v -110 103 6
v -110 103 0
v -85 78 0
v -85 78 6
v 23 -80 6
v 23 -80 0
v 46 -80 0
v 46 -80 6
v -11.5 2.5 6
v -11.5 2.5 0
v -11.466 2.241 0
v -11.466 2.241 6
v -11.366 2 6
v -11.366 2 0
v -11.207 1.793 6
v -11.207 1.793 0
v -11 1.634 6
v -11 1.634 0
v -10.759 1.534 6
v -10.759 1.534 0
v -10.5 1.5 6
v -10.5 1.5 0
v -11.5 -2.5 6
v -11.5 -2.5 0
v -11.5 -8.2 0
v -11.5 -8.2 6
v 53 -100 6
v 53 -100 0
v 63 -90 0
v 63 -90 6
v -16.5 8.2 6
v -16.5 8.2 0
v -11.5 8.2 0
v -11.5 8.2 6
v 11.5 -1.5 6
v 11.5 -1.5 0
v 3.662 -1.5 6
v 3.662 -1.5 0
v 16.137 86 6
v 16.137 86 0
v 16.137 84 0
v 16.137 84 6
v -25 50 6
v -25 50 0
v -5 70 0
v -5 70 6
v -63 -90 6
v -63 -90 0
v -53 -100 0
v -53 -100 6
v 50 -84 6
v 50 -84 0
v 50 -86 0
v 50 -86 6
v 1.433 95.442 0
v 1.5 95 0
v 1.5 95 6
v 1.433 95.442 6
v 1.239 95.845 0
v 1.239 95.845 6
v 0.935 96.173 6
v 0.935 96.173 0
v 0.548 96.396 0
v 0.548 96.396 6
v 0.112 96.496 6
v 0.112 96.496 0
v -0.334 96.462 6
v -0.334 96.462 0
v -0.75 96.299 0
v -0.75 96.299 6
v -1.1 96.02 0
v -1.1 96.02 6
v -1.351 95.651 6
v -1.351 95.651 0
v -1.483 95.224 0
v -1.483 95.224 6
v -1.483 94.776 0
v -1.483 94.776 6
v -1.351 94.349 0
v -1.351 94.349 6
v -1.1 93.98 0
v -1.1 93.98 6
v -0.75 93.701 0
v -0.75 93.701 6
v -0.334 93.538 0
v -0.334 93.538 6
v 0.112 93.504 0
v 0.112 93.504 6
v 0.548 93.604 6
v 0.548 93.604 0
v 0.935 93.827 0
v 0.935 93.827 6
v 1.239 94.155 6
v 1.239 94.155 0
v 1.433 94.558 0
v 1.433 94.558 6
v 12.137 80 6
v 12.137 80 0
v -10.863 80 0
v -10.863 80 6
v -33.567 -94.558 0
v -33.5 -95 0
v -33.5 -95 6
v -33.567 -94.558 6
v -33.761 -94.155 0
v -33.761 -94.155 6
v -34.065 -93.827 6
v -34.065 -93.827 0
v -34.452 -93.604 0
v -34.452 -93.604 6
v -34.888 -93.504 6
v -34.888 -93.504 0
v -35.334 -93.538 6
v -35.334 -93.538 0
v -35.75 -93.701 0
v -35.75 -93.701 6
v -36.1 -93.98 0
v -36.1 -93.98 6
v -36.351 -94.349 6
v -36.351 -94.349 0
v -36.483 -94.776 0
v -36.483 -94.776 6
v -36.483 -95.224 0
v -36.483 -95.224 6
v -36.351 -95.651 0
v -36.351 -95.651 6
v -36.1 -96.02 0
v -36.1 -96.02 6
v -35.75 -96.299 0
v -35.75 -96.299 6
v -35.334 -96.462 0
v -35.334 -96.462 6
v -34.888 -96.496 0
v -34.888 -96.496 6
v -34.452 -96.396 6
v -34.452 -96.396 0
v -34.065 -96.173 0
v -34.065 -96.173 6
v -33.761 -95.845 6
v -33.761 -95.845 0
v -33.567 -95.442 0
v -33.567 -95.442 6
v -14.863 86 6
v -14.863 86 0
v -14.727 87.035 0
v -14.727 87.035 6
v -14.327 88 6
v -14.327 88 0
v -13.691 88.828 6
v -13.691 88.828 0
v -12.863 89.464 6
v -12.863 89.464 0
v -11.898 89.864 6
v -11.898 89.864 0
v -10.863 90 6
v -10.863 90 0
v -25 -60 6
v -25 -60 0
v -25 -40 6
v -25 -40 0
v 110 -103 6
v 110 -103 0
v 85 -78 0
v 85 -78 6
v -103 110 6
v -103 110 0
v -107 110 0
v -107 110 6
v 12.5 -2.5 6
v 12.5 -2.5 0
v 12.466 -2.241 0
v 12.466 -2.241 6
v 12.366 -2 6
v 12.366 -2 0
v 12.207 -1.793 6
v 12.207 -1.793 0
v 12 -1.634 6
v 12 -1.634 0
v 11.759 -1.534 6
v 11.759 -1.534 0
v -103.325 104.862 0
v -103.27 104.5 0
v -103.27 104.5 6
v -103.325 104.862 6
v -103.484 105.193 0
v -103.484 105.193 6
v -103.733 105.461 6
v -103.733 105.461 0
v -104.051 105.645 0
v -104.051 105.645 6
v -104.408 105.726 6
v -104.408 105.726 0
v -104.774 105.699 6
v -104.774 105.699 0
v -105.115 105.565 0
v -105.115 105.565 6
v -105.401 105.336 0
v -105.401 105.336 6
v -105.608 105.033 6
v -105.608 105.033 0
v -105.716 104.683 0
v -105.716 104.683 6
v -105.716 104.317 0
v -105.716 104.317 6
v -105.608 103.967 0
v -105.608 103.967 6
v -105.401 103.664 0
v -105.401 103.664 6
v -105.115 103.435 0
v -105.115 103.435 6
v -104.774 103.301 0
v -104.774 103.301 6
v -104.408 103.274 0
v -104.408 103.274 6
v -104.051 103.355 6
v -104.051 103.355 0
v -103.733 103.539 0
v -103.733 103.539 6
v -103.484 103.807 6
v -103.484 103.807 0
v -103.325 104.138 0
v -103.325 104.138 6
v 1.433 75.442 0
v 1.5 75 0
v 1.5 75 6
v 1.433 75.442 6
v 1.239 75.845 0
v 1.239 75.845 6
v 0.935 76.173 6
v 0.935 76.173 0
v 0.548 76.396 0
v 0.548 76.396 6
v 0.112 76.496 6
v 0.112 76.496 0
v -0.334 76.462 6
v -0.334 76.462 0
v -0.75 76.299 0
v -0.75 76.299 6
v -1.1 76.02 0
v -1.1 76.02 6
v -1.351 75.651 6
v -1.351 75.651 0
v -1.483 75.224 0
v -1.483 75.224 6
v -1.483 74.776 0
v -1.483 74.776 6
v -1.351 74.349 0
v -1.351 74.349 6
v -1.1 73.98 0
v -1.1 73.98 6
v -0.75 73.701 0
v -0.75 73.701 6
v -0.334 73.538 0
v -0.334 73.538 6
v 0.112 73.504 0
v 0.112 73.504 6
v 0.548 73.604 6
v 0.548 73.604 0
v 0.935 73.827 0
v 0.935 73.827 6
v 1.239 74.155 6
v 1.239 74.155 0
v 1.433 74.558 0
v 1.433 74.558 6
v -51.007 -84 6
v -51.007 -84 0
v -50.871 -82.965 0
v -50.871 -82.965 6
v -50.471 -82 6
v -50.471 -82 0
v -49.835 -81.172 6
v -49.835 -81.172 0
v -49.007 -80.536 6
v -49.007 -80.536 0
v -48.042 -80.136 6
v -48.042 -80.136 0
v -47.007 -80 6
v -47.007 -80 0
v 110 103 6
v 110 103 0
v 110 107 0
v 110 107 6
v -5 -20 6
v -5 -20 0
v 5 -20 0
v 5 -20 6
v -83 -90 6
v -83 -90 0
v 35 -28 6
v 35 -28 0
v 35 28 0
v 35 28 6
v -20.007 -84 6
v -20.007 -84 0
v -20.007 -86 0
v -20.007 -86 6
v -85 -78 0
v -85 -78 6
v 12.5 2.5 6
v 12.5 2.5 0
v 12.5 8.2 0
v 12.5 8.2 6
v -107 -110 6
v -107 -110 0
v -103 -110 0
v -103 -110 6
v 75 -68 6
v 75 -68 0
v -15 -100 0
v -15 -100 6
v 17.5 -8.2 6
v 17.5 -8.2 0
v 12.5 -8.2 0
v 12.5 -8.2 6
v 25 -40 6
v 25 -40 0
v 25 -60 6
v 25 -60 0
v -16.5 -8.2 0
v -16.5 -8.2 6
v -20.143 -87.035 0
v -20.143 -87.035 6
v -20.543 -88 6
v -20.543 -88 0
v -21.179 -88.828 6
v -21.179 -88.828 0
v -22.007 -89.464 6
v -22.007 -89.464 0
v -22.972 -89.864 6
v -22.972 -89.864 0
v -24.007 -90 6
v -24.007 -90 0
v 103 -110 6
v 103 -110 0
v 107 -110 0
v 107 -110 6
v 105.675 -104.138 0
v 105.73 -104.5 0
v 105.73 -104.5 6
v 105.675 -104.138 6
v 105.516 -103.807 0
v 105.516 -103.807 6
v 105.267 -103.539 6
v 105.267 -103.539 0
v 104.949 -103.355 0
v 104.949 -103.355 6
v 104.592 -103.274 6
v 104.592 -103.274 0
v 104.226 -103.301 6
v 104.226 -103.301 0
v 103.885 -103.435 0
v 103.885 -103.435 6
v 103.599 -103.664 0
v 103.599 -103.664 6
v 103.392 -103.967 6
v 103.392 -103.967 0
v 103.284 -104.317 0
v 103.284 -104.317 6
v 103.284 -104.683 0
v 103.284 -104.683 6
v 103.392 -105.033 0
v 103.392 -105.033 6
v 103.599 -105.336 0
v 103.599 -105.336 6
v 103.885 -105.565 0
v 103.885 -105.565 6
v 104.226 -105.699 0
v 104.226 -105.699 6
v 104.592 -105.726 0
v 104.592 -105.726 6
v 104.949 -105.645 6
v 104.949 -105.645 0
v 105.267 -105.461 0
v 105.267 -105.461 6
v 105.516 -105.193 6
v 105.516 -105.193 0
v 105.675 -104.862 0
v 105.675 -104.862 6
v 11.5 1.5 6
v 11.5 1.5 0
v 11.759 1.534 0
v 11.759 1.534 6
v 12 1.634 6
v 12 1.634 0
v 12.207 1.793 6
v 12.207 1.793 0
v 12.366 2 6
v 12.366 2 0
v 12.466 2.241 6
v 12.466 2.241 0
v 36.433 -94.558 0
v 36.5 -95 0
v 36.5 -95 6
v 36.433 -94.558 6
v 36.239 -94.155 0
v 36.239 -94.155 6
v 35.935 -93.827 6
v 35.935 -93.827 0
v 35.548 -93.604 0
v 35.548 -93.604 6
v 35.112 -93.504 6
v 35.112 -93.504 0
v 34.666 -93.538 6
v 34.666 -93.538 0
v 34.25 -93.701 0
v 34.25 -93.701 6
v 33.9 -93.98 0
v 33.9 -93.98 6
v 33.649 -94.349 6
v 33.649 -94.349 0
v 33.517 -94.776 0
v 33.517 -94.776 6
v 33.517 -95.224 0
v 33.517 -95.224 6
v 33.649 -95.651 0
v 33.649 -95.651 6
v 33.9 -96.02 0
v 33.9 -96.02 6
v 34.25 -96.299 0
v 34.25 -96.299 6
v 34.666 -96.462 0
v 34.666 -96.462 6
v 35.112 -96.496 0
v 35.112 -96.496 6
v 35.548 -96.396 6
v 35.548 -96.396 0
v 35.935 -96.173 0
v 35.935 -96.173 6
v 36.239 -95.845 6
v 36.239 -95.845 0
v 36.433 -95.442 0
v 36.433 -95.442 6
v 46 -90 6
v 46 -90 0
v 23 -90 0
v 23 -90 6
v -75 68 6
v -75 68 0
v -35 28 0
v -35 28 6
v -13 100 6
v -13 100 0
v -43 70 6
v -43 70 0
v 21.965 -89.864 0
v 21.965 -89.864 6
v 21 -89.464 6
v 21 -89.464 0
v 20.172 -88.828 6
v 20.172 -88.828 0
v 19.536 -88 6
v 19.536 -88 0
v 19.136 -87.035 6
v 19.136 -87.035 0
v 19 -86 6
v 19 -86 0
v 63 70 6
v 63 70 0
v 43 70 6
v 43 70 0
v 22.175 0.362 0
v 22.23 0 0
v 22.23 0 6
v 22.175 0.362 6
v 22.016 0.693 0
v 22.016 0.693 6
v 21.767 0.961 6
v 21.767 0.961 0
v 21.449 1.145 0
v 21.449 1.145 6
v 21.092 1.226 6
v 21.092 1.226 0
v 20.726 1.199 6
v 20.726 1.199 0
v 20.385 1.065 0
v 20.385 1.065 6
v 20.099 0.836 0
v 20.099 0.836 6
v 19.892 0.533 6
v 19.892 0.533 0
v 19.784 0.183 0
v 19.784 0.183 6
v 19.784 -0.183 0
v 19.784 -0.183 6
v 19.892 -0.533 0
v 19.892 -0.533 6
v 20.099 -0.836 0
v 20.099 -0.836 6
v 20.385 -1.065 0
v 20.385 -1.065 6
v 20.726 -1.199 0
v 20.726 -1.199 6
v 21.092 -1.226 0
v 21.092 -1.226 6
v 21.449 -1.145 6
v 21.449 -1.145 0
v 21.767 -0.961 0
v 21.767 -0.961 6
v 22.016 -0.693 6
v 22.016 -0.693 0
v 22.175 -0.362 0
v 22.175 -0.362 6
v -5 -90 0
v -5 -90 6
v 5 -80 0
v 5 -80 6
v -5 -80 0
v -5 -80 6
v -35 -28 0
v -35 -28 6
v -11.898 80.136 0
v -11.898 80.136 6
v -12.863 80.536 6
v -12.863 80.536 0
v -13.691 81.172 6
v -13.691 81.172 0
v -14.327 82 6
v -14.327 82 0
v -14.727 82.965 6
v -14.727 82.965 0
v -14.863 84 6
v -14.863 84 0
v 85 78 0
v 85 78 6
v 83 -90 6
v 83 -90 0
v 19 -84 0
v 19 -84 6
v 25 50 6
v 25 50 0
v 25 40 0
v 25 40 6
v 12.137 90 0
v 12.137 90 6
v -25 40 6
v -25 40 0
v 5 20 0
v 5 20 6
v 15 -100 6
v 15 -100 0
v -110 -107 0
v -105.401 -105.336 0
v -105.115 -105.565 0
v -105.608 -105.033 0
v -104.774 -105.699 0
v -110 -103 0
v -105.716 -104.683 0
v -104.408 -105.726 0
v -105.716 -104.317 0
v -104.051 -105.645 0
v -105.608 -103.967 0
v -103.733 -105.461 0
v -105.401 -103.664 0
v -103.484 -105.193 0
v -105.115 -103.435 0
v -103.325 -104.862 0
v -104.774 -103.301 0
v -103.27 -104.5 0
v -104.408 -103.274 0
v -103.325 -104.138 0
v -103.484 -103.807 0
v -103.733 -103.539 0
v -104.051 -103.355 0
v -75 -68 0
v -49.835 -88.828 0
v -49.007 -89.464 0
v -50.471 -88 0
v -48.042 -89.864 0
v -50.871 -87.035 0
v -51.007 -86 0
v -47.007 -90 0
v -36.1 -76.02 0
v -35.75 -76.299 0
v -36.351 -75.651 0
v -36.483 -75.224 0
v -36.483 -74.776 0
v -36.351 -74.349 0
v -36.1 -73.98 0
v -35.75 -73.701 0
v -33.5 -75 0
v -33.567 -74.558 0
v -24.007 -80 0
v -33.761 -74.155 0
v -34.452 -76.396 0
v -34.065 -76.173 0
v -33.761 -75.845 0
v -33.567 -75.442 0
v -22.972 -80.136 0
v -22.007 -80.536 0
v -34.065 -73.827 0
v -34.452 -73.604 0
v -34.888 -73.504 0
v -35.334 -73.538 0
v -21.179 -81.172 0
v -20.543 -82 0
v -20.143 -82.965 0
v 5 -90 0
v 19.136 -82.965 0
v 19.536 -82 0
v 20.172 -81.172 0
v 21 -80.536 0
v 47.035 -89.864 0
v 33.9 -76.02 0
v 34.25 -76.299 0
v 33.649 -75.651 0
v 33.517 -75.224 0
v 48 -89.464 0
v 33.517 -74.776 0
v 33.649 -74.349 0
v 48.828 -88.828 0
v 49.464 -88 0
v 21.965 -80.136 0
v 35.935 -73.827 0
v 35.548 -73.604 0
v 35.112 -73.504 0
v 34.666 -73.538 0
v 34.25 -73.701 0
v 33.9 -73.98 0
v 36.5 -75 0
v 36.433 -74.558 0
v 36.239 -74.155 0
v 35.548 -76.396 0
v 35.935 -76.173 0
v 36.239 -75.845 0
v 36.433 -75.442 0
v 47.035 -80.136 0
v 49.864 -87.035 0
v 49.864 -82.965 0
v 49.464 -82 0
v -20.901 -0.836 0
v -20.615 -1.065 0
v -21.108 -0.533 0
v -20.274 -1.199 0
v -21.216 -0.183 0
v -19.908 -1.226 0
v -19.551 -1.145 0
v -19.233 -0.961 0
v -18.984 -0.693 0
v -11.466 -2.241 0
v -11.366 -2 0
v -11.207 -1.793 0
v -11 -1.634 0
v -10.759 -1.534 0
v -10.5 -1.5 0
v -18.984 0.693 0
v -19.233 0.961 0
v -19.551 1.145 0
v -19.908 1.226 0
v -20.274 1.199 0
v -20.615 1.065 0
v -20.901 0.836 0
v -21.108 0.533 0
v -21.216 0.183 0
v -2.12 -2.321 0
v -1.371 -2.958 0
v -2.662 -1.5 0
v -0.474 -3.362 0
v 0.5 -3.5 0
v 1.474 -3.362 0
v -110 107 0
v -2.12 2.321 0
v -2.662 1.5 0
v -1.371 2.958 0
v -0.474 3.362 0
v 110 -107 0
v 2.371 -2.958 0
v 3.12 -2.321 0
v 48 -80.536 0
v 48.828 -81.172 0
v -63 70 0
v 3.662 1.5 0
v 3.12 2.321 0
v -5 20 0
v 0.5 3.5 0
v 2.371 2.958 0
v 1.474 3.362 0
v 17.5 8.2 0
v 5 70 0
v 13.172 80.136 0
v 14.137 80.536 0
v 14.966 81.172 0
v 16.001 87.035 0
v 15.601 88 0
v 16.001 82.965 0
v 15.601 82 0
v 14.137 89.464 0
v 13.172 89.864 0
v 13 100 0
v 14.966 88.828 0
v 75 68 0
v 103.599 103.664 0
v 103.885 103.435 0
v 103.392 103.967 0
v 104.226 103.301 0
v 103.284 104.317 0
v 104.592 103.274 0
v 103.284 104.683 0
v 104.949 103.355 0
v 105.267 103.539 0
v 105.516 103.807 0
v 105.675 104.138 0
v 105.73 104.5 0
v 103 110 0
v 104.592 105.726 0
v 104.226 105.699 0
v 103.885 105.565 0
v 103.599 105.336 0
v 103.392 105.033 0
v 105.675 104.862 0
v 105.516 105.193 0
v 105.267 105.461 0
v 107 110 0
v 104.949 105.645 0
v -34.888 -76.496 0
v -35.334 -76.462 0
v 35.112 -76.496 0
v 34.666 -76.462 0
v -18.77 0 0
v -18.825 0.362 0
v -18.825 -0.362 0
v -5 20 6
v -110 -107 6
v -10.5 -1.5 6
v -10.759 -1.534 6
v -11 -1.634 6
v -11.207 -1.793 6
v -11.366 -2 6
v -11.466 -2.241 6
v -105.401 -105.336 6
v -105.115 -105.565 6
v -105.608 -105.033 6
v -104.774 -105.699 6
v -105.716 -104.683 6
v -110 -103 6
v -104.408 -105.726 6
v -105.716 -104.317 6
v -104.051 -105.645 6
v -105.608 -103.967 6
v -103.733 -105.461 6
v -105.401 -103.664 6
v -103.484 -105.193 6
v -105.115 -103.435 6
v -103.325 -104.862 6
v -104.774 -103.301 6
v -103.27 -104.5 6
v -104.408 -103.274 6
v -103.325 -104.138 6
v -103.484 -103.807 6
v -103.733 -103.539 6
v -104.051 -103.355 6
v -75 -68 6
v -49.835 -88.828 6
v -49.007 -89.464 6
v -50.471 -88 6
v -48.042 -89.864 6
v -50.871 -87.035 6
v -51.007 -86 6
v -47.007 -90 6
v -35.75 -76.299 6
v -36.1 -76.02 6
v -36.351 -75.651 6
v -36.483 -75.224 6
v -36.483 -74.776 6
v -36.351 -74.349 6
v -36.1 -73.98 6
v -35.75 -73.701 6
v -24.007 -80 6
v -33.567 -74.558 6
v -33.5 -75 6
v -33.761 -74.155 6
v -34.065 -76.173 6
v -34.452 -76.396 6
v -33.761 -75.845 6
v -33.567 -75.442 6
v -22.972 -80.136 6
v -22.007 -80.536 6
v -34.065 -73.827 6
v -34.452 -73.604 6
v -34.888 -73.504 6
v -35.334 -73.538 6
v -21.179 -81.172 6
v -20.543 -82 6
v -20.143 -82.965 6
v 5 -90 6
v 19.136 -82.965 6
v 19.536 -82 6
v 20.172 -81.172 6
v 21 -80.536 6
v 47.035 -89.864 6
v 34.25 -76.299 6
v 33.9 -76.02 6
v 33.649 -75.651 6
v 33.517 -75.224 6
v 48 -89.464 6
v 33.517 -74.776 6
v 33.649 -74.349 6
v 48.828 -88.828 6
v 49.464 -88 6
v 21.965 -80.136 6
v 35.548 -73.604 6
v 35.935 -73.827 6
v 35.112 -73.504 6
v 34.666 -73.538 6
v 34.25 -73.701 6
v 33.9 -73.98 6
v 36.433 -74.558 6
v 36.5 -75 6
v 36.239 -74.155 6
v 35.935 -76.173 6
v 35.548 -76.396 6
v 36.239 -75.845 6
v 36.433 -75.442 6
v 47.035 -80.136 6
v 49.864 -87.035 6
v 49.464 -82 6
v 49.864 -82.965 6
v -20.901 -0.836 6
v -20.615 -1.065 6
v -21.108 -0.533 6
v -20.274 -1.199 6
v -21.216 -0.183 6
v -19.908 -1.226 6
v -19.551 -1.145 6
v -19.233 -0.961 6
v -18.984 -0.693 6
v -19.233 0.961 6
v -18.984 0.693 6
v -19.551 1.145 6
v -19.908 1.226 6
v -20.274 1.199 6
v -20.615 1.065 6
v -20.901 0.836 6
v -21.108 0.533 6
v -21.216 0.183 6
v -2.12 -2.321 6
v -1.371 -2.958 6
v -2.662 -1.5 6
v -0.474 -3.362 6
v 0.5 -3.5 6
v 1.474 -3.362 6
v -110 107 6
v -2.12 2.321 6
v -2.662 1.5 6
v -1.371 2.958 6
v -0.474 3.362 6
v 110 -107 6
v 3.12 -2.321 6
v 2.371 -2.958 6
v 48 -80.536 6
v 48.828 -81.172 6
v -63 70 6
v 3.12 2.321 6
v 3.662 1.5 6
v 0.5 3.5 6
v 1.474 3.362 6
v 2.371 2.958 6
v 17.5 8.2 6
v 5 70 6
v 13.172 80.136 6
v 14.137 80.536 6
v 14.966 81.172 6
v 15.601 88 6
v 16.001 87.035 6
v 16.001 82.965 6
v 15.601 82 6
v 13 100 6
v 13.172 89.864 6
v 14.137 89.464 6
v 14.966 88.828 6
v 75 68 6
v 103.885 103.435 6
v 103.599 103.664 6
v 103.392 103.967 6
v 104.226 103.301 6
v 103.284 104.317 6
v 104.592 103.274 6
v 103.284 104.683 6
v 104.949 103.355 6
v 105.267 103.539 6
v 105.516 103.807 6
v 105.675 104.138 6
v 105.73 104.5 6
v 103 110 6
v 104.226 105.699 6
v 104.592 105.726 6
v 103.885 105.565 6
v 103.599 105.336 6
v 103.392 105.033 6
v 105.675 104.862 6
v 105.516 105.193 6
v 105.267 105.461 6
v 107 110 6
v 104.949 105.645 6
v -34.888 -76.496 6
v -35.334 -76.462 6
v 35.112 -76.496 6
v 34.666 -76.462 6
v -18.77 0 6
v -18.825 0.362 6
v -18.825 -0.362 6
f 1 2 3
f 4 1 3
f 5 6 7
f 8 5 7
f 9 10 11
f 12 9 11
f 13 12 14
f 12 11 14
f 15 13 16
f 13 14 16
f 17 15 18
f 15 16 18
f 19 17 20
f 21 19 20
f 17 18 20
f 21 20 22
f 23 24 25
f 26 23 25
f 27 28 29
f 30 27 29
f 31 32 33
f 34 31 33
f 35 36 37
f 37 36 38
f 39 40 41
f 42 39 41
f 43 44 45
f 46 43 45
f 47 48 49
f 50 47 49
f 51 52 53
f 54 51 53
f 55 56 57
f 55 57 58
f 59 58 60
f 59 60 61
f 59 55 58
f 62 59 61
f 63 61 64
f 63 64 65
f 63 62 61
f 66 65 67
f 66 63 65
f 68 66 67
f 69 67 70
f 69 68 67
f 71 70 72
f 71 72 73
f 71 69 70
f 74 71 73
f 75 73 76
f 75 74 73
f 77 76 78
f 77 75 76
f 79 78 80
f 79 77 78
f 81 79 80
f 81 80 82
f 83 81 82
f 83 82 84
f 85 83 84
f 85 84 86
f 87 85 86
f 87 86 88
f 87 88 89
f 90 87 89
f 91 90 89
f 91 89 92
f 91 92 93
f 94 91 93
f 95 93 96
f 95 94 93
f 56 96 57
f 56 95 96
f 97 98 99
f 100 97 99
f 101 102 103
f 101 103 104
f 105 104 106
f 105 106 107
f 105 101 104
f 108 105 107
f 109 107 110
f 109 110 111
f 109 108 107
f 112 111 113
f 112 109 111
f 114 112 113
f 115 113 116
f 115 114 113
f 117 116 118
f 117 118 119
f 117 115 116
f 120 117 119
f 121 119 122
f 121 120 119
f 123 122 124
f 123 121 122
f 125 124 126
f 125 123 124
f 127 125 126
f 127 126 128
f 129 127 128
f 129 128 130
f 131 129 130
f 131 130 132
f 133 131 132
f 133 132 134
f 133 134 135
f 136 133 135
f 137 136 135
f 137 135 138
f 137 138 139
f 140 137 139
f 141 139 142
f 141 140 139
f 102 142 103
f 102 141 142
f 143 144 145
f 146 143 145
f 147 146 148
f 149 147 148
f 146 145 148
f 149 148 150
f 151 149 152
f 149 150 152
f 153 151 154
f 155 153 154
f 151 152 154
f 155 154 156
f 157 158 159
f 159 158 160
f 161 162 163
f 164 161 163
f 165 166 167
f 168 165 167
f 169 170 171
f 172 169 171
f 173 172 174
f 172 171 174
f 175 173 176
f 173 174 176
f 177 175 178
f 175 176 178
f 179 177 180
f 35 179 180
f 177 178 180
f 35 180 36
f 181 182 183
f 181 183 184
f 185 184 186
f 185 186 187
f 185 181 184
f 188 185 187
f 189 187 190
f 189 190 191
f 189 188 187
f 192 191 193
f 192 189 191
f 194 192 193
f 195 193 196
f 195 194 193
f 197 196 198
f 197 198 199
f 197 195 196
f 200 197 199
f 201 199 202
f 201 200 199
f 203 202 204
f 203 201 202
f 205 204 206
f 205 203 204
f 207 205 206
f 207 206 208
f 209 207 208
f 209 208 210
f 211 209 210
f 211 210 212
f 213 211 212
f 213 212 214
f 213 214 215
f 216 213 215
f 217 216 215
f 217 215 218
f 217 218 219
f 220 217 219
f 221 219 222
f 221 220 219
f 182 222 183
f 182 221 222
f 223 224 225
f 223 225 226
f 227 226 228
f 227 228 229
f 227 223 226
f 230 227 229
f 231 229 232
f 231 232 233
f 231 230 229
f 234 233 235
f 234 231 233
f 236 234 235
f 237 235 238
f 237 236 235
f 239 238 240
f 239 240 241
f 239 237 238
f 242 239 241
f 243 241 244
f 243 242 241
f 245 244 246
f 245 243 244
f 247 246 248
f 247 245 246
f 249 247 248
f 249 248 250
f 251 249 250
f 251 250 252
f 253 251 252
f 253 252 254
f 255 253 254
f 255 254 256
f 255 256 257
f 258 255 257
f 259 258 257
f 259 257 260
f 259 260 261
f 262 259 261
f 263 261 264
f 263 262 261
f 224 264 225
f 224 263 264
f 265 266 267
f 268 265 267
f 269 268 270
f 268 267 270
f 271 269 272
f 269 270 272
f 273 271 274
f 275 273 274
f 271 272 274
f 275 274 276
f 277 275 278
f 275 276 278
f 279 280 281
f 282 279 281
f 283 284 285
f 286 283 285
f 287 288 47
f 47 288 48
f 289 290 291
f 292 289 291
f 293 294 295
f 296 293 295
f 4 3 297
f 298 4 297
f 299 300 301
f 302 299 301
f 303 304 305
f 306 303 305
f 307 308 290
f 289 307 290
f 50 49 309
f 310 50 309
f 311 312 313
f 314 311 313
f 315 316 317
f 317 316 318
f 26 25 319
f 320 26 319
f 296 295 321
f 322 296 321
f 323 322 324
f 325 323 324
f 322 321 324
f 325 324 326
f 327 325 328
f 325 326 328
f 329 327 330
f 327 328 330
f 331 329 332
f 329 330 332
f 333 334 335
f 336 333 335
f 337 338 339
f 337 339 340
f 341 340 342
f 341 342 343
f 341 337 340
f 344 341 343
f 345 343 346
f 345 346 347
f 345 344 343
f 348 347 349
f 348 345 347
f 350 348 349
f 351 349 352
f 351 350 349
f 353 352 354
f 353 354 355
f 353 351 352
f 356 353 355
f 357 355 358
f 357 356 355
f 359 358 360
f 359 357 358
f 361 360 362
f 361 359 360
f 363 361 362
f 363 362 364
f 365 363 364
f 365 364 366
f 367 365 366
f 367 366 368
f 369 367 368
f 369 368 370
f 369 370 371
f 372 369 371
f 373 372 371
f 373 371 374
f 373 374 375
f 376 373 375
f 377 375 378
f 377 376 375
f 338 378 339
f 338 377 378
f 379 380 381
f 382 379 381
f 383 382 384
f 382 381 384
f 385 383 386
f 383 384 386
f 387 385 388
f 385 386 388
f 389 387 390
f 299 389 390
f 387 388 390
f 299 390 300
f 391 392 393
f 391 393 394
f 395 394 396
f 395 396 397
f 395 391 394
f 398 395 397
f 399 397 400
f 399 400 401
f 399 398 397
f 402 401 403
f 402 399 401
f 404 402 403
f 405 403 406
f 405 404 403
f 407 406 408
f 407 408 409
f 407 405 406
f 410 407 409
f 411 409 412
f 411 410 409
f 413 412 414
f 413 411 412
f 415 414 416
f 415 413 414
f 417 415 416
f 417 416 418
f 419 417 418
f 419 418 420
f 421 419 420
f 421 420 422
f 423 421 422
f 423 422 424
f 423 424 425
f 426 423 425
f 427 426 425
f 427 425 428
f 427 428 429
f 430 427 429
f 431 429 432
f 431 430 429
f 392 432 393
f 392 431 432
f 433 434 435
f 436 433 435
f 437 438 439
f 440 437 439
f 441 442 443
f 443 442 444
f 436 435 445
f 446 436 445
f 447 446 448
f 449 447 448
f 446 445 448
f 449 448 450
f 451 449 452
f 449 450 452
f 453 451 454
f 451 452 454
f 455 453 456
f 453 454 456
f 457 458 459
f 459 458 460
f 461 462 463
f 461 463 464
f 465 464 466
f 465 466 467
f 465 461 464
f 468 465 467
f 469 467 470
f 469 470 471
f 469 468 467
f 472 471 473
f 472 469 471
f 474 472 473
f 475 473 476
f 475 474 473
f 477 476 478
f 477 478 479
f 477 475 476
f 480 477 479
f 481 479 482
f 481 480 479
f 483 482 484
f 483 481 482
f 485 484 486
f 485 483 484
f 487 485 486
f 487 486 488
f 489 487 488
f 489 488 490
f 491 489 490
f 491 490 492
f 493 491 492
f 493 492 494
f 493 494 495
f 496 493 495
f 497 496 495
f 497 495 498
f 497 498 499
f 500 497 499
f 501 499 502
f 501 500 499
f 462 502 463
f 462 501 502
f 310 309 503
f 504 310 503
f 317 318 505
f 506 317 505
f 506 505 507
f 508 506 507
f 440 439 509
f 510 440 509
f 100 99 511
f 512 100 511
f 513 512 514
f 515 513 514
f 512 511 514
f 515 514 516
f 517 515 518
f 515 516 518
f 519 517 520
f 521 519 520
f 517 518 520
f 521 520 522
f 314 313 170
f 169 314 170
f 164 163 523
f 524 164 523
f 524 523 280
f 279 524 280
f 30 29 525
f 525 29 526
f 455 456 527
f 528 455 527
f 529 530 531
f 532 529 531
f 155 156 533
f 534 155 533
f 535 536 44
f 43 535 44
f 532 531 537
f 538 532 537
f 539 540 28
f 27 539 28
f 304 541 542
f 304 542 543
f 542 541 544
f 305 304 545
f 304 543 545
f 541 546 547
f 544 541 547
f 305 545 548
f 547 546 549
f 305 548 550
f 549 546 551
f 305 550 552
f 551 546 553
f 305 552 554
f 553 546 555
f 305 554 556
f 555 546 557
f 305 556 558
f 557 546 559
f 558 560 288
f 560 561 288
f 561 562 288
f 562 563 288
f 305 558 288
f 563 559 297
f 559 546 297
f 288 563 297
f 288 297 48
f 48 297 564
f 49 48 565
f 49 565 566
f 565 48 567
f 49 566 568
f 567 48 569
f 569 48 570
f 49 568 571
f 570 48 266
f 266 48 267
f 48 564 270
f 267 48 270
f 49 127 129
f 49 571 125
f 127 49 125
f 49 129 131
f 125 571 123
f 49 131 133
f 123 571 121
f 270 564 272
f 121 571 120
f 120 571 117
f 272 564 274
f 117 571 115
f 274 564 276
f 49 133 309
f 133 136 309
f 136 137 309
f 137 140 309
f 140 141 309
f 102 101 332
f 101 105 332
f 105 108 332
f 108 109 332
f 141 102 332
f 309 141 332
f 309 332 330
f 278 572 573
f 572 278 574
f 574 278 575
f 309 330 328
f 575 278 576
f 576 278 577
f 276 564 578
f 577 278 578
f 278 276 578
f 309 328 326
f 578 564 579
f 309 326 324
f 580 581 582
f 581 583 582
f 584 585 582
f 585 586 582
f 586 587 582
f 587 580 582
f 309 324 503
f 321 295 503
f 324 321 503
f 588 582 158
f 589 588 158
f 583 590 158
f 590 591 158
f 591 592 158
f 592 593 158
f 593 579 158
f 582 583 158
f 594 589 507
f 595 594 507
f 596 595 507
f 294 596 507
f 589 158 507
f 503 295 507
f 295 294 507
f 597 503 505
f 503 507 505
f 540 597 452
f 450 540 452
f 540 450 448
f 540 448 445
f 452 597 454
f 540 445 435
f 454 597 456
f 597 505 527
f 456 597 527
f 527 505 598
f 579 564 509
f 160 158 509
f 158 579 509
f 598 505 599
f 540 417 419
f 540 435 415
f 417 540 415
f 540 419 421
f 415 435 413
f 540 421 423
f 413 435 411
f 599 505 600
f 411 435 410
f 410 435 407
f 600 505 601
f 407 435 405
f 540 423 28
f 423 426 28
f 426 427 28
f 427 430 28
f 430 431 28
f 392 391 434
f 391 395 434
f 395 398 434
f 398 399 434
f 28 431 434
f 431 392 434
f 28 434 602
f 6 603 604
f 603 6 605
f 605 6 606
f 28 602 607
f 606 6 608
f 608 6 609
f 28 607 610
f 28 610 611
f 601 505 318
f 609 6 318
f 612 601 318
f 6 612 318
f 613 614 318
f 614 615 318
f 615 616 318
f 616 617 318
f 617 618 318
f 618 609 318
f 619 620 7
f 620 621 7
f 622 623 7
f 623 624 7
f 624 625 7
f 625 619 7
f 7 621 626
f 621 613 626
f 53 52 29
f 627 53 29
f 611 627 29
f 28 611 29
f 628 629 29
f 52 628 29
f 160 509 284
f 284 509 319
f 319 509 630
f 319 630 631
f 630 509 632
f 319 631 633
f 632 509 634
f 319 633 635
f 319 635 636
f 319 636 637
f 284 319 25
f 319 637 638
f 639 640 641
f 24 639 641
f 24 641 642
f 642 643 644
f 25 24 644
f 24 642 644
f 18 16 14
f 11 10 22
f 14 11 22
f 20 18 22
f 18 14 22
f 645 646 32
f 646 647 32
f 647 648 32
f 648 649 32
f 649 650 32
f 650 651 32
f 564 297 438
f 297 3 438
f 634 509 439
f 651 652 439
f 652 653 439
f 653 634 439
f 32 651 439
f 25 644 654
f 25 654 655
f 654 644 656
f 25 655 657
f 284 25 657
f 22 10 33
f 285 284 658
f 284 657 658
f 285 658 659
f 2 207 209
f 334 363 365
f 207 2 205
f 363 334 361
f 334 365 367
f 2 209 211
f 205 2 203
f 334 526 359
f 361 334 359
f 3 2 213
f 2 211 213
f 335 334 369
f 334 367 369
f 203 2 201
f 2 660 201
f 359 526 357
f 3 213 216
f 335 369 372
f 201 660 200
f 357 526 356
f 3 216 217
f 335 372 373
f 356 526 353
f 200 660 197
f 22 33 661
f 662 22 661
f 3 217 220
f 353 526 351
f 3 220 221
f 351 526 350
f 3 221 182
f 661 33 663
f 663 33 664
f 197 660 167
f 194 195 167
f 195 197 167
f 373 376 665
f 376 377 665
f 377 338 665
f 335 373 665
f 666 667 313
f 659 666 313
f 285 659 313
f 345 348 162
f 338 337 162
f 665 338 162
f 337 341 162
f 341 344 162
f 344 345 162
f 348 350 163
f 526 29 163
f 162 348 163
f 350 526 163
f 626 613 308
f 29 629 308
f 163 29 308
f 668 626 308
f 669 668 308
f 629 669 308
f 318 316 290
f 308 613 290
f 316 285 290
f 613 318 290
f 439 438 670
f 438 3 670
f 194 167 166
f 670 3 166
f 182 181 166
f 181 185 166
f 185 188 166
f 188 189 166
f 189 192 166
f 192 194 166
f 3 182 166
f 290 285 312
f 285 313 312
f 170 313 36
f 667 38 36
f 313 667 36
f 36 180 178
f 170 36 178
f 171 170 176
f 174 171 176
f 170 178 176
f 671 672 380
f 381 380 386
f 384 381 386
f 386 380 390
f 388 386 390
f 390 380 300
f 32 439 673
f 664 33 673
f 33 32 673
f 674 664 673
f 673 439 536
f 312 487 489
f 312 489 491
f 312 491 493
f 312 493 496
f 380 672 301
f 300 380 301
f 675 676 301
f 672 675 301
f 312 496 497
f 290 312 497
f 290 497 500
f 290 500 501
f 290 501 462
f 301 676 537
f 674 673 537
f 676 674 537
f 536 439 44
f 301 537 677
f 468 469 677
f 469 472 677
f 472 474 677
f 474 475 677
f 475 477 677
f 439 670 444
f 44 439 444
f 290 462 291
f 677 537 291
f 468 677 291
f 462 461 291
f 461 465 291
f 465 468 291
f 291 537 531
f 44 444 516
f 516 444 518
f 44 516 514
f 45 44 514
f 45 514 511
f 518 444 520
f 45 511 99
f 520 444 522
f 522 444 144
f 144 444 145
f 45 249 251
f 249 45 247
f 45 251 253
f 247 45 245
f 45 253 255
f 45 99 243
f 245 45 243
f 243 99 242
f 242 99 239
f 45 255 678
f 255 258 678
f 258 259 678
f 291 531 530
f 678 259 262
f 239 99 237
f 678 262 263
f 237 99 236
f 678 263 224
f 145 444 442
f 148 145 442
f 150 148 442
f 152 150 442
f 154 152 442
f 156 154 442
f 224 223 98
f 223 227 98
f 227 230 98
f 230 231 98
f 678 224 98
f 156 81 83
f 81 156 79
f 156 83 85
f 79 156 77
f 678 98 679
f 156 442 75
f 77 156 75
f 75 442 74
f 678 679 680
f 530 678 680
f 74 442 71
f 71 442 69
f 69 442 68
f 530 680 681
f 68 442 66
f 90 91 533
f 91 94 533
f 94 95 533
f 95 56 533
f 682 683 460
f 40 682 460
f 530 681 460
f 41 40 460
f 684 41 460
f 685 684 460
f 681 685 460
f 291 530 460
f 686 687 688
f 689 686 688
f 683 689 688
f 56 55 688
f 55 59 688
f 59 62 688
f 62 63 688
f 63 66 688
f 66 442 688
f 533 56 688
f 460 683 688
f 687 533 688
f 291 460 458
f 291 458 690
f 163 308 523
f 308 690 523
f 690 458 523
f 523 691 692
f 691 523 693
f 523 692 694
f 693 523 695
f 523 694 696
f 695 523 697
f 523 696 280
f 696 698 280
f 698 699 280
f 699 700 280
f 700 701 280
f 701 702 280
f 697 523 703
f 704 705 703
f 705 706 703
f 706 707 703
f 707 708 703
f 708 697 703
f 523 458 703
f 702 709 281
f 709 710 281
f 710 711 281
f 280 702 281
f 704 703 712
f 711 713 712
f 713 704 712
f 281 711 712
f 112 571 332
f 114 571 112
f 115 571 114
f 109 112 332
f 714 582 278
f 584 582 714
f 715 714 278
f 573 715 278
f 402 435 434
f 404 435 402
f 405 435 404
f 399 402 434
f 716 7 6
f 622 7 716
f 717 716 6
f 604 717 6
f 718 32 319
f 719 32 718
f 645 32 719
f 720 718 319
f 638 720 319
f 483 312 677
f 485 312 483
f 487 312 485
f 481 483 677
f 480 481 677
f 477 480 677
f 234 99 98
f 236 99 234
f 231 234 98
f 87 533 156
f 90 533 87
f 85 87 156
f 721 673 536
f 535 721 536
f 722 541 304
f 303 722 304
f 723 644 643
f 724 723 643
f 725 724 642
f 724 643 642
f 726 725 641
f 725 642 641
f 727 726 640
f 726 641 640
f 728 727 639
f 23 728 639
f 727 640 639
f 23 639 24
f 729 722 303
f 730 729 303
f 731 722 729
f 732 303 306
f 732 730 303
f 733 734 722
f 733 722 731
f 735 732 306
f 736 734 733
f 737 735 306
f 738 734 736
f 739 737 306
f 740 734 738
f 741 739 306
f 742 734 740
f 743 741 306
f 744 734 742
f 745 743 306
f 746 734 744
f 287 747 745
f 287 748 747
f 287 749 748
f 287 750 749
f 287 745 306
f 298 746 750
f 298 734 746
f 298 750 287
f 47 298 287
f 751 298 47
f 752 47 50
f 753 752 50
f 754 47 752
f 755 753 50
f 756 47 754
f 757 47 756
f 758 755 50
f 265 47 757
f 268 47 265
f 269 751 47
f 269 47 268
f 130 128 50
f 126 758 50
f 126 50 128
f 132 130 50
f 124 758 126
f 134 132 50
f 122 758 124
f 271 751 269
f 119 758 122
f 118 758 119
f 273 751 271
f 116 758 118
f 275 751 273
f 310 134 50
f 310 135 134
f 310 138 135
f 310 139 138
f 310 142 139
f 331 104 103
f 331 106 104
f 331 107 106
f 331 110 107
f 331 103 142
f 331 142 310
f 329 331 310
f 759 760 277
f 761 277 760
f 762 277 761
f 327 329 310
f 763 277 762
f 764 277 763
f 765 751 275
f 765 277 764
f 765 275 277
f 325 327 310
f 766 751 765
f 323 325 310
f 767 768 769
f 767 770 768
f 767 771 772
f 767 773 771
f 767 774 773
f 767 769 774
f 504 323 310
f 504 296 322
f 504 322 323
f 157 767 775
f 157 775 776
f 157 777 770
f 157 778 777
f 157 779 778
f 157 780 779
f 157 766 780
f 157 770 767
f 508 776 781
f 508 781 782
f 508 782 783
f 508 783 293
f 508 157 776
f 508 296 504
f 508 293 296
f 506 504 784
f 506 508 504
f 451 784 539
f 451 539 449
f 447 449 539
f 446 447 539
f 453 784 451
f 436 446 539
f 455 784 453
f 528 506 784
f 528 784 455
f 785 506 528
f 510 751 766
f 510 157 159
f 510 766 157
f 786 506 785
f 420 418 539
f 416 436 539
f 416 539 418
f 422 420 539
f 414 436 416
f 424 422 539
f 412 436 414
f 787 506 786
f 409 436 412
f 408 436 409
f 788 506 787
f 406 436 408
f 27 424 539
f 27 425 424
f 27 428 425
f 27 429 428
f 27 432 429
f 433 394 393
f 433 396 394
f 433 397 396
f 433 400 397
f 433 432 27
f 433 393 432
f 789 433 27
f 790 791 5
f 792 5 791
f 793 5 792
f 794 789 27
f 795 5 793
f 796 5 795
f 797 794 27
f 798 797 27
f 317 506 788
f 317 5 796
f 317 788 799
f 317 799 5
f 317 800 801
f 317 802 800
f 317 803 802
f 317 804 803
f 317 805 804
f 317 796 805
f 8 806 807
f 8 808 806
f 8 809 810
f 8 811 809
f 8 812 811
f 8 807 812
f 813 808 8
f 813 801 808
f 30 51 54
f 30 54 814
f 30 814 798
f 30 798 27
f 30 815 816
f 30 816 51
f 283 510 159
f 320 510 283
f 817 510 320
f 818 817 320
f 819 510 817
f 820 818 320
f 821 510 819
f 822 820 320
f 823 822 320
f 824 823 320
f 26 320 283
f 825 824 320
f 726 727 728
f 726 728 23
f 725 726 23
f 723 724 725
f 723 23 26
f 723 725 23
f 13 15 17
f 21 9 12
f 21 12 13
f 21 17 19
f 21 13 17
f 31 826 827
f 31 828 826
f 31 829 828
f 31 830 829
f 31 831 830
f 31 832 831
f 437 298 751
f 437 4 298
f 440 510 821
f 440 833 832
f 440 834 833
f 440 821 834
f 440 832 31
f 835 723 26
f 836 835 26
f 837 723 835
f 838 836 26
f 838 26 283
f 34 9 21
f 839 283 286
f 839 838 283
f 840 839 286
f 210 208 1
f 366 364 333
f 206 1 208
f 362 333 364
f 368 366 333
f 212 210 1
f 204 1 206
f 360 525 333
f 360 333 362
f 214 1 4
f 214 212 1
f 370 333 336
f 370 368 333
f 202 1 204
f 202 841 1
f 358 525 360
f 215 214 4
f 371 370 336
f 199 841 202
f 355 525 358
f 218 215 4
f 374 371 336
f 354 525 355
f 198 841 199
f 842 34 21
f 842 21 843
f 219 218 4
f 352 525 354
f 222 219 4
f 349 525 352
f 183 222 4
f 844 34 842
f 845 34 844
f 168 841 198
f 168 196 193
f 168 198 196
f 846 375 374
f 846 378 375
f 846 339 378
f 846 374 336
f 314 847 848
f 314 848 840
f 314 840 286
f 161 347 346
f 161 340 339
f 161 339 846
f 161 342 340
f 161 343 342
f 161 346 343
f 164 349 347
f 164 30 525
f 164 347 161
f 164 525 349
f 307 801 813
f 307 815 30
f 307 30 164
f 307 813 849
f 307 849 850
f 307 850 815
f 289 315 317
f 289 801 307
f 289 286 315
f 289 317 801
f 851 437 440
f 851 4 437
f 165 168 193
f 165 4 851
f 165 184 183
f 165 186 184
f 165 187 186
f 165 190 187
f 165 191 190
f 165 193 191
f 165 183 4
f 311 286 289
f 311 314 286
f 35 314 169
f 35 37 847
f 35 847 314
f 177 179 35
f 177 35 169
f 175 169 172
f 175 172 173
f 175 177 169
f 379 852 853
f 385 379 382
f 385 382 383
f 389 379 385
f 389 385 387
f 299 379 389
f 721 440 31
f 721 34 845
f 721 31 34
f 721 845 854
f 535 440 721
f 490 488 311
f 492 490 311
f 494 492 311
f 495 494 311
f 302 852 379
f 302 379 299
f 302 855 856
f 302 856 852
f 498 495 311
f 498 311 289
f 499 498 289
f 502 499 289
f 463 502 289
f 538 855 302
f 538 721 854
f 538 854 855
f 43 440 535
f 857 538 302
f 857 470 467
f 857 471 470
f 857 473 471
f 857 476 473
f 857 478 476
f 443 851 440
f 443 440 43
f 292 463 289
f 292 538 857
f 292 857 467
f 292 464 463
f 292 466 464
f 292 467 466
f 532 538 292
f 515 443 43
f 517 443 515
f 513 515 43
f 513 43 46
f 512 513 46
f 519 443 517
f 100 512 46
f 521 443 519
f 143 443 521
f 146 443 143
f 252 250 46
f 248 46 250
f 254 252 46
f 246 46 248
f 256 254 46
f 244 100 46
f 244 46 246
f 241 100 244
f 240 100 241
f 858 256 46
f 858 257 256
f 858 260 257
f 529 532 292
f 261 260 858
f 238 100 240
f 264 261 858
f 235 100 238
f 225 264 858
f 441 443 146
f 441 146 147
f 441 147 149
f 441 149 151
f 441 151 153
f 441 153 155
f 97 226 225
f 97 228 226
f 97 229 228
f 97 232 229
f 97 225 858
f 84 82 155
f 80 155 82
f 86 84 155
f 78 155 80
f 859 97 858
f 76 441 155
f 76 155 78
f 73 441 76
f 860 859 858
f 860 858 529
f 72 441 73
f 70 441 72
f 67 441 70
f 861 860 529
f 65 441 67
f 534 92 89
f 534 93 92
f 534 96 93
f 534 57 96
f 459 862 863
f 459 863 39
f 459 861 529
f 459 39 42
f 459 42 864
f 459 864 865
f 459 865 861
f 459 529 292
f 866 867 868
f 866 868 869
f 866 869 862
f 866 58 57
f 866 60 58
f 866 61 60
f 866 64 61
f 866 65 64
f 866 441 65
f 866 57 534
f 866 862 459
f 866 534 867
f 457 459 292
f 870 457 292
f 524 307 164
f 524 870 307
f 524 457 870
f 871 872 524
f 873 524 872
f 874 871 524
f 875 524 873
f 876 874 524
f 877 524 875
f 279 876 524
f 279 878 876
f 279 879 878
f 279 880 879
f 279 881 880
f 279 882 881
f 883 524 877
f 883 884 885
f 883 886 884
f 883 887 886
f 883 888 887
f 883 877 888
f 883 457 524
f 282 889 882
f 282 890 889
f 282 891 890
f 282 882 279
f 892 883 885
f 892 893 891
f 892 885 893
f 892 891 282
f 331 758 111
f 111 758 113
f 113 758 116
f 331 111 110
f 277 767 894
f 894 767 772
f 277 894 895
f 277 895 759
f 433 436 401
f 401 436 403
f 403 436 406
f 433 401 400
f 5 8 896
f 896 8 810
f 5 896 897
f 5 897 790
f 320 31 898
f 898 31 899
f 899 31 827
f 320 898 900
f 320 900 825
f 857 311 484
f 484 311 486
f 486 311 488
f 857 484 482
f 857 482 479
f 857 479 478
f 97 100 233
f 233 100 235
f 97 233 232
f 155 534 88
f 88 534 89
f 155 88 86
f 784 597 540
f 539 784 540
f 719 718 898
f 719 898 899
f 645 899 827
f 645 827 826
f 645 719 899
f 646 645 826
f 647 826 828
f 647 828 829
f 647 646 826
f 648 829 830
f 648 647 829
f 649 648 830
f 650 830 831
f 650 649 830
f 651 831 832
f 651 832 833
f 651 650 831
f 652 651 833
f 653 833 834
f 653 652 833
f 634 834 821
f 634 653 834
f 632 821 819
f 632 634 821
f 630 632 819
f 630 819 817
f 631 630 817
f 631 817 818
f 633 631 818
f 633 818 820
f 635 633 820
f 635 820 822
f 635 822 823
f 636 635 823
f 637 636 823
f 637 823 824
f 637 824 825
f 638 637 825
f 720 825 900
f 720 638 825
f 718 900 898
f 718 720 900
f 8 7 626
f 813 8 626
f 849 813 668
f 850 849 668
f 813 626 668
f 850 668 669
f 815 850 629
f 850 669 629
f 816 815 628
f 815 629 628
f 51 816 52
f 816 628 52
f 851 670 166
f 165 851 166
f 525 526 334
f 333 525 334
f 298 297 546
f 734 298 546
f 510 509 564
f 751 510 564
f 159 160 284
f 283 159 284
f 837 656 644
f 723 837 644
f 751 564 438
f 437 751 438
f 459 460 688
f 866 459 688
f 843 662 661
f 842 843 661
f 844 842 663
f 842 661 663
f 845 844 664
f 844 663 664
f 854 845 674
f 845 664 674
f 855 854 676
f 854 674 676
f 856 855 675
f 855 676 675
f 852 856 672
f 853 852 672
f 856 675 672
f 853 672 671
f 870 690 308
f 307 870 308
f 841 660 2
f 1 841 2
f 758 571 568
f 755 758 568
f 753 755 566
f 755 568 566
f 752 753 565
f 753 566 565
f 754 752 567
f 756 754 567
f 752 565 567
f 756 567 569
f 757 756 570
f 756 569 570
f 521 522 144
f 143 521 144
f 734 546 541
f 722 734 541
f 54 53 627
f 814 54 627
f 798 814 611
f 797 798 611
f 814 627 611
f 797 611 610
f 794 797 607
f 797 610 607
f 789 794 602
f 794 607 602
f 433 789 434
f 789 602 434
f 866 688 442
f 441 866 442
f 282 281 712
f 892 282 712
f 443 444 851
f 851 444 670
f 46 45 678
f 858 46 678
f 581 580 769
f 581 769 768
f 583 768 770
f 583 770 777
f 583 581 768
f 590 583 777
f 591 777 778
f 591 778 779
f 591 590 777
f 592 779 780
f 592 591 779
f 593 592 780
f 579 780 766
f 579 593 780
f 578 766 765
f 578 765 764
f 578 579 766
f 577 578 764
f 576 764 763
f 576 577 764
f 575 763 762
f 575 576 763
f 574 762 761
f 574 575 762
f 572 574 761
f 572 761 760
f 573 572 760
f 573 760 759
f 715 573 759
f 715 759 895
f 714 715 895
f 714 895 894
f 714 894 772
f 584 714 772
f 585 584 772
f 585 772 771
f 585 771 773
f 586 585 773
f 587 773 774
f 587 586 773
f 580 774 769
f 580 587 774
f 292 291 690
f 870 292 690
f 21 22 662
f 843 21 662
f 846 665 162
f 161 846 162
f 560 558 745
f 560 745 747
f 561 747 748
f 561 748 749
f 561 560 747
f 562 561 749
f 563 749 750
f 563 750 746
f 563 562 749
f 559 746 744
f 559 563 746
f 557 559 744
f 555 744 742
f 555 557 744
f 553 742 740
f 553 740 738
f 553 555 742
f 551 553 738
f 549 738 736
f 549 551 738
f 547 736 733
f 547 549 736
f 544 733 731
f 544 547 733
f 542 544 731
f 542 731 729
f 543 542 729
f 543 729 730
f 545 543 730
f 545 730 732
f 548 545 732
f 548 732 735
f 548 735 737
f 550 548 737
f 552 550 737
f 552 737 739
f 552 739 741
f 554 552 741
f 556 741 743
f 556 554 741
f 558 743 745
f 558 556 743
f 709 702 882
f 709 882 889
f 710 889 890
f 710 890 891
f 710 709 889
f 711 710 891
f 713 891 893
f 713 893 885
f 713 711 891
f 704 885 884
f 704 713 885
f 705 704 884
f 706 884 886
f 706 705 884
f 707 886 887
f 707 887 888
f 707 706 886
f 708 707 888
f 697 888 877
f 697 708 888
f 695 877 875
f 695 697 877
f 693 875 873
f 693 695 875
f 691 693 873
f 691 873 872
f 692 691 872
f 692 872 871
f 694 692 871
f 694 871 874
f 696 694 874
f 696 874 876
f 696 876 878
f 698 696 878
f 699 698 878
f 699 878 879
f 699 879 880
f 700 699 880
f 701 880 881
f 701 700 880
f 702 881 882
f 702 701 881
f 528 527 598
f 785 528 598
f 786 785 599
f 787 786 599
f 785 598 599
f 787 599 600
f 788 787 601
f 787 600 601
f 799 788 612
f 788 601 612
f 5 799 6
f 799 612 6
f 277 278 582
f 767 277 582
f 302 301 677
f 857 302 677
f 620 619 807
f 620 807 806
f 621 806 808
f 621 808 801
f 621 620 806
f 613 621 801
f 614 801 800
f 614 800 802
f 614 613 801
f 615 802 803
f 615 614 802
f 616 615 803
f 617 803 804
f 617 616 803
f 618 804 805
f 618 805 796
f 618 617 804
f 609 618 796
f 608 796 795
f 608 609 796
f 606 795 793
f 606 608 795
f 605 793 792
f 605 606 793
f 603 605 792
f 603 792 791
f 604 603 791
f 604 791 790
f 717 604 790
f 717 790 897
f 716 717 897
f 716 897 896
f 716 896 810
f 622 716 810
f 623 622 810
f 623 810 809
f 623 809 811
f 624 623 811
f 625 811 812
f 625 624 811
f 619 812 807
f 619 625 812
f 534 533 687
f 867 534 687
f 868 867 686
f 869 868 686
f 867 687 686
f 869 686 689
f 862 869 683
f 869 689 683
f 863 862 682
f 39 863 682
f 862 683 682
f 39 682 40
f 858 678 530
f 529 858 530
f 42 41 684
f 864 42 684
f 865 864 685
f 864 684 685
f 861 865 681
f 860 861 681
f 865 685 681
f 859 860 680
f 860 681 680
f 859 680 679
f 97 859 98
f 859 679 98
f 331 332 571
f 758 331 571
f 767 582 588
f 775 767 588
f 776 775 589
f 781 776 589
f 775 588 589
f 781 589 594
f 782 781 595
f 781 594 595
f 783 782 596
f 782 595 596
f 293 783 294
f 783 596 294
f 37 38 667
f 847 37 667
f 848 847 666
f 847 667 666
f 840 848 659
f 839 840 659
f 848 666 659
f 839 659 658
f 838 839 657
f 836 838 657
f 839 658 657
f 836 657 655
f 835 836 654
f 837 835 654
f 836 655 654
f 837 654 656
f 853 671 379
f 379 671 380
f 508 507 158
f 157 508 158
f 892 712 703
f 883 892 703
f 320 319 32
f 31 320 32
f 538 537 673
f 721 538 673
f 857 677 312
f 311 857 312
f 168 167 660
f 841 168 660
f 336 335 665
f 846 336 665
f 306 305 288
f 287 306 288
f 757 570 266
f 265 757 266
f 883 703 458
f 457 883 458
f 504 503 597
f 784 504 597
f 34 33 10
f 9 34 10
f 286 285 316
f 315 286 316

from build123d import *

# Parameters (mm, degrees)
F0_R     = 1.2295
F0_R_2   = 1.5
F1_DEPTH = 6


# Not quite as in the source:
# - ends of sketch curves that miss each other by under 0.0002 mm in the source are joined


with BuildPart() as f1:
    # F0 (on Top) → F1 (new body)
    with BuildSketch(Plane.XY):
        Polygon((-110, -103), (-110, -107), (-107, -110), (-103, -110), (-83, -90), (-63, -90), (-53, -100), (-15, -100), (-5, -90), (5, -90), (15, -100), (53, -100), (63, -90), (83, -90), (103, -110), (107, -110), (110, -107), (110, -103), (85, -78), (85, 78), (110, 103), (110, 107), (107, 110), (103, 110), (63, 70), (43, 70), (13, 100), (-13, 100), (-43, 70), (-63, 70), (-103, 110), (-107, 110), (-110, 107), (-110, 103), (-85, 78), (-85, -78), align=None)
        with Locations((-104.5, -104.5)):
            Circle(F0_R, mode=Mode.SUBTRACT)
        with Locations((-34.999989, -95.000012)):
            Circle(F0_R_2, mode=Mode.SUBTRACT)
        with BuildLine():
            ThreePointArc((-20.007037, -86), (-21.1786098753, -88.8284271247), (-24.007037, -90))
            Line((-24.007037, -90), (-47.007037, -90))
            ThreePointArc((-47.007037, -90), (-49.8354641247, -88.8284271247), (-51.007037, -86))
            Line((-51.007037, -86), (-51.007037, -84))
            ThreePointArc((-51.007037, -84), (-49.8354641247, -81.1715728753), (-47.007037, -80))
            Line((-47.007037, -80), (-24.007037, -80))
            ThreePointArc((-24.007037, -80), (-21.1786098753, -81.1715728753), (-20.007037, -84))
            Line((-20.007037, -84), (-20.007037, -86))
        make_face(mode=Mode.SUBTRACT)
        with Locations((-34.999989, -75.000012)):
            Circle(F0_R_2, mode=Mode.SUBTRACT)
        with Locations((35.000011, -95.000012)):
            Circle(F0_R_2, mode=Mode.SUBTRACT)
        with BuildLine():
            ThreePointArc((50, -86), (48.8284271247, -88.8284271247), (46, -90))
            Line((46, -90), (23, -90))
            ThreePointArc((23, -90), (20.1715728753, -88.8284271247), (19, -86))
            Line((19, -86), (19, -84))
            ThreePointArc((19, -84), (20.1715728753, -81.1715728753), (23, -80))
            Line((23, -80), (46, -80))
            ThreePointArc((46, -80), (48.8284271247, -81.1715728753), (50, -84))
            Line((50, -84), (50, -86))
        make_face(mode=Mode.SUBTRACT)
        with Locations((35.000011, -75.000012)):
            Circle(F0_R_2, mode=Mode.SUBTRACT)
        with Locations((104.5, -104.5)):
            Circle(F0_R, mode=Mode.SUBTRACT)
        Polygon((25, -60), (5, -80), (-5, -80), (-25, -60), (-25, -40), (-5, -20), (5, -20), (25, -40), align=None, mode=Mode.SUBTRACT)
        Polygon((-75, -68), (-75, 68), (-35, 28), (-35, -28), align=None, mode=Mode.SUBTRACT)
        with Locations((-20, 0)):
            Circle(F0_R, mode=Mode.SUBTRACT)
        with Locations((-104.5, 104.5)):
            Circle(F0_R, mode=Mode.SUBTRACT)
        with BuildLine():
            Line((-16.5, -8.2), (-16.5, 8.2))
            Line((-16.5, 8.2), (-11.5, 8.2))
            Line((-11.5, 8.2), (-11.5, 2.5))
            ThreePointArc((-11.5, 2.5), (-11.2071067812, 1.7928932188), (-10.5, 1.5))
            Line((-10.5, 1.5), (-2.662278, 1.5))
            ThreePointArc((-2.662278, 1.5), (0.4999997857, 3.5), (3.6622775389, 1.5000002556))
            Line((3.6622775389, 1.5000002556), (11.5, 1.5))
            ThreePointArc((11.5, 1.5), (12.2071067812, 1.7928932188), (12.5, 2.5))
            Line((12.5, 2.5), (12.5, 8.2))
            Line((12.5, 8.2), (17.5, 8.2))
            Line((17.5, 8.2), (17.5, -8.2))
            Line((17.5, -8.2), (12.5, -8.2))
            Line((12.5, -8.2), (12.5, -2.5))
            ThreePointArc((12.5, -2.5), (12.2071067812, -1.7928932188), (11.5, -1.5))
            Line((11.5, -1.5), (3.662277, -1.5))
            ThreePointArc((3.662277, -1.5), (0.4999997857, -3.5), (-2.6622777226, -1.4999998684))
            Line((-2.6622777226, -1.4999998684), (-10.5, -1.5))
            ThreePointArc((-10.5, -1.5), (-11.2071067812, -1.7928932188), (-11.5, -2.5))
            Line((-11.5, -2.5), (-11.5, -8.2))
            Line((-11.5, -8.2), (-16.5, -8.2))
        make_face(mode=Mode.SUBTRACT)
        with Locations((21, 0)):
            Circle(F0_R, mode=Mode.SUBTRACT)
        Polygon((-5, 20), (-25, 40), (-25, 50), (-5, 70), (5, 70), (25, 50), (25, 40), (5, 20), align=None, mode=Mode.SUBTRACT)
        Polygon((75, 68), (75, -68), (35, -28), (35, 28), align=None, mode=Mode.SUBTRACT)
        with Locations((1.1e-05, 74.999988)):
            Circle(F0_R_2, mode=Mode.SUBTRACT)
        with BuildLine():
            ThreePointArc((16.137123, 84), (14.9655501247, 81.1715728753), (12.137123, 80))
            Line((12.137123, 80), (-10.862877, 80))
            ThreePointArc((-10.862877, 80), (-13.6913041247, 81.1715728753), (-14.862877, 84))
            Line((-14.862877, 84), (-14.862877, 86))
            ThreePointArc((-14.862877, 86), (-13.6913041247, 88.8284271247), (-10.862877, 90))
            Line((-10.862877, 90), (12.137123, 90))
            ThreePointArc((12.137123, 90), (14.9655501247, 88.8284271247), (16.137123, 86))
            Line((16.137123, 86), (16.137123, 84))
        make_face(mode=Mode.SUBTRACT)
        with Locations((1.1e-05, 94.999988)):
            Circle(F0_R_2, mode=Mode.SUBTRACT)
        with Locations((104.5, 104.5)):
            Circle(F0_R, mode=Mode.SUBTRACT)
    extrude(amount=F1_DEPTH)


solid = f1.part
